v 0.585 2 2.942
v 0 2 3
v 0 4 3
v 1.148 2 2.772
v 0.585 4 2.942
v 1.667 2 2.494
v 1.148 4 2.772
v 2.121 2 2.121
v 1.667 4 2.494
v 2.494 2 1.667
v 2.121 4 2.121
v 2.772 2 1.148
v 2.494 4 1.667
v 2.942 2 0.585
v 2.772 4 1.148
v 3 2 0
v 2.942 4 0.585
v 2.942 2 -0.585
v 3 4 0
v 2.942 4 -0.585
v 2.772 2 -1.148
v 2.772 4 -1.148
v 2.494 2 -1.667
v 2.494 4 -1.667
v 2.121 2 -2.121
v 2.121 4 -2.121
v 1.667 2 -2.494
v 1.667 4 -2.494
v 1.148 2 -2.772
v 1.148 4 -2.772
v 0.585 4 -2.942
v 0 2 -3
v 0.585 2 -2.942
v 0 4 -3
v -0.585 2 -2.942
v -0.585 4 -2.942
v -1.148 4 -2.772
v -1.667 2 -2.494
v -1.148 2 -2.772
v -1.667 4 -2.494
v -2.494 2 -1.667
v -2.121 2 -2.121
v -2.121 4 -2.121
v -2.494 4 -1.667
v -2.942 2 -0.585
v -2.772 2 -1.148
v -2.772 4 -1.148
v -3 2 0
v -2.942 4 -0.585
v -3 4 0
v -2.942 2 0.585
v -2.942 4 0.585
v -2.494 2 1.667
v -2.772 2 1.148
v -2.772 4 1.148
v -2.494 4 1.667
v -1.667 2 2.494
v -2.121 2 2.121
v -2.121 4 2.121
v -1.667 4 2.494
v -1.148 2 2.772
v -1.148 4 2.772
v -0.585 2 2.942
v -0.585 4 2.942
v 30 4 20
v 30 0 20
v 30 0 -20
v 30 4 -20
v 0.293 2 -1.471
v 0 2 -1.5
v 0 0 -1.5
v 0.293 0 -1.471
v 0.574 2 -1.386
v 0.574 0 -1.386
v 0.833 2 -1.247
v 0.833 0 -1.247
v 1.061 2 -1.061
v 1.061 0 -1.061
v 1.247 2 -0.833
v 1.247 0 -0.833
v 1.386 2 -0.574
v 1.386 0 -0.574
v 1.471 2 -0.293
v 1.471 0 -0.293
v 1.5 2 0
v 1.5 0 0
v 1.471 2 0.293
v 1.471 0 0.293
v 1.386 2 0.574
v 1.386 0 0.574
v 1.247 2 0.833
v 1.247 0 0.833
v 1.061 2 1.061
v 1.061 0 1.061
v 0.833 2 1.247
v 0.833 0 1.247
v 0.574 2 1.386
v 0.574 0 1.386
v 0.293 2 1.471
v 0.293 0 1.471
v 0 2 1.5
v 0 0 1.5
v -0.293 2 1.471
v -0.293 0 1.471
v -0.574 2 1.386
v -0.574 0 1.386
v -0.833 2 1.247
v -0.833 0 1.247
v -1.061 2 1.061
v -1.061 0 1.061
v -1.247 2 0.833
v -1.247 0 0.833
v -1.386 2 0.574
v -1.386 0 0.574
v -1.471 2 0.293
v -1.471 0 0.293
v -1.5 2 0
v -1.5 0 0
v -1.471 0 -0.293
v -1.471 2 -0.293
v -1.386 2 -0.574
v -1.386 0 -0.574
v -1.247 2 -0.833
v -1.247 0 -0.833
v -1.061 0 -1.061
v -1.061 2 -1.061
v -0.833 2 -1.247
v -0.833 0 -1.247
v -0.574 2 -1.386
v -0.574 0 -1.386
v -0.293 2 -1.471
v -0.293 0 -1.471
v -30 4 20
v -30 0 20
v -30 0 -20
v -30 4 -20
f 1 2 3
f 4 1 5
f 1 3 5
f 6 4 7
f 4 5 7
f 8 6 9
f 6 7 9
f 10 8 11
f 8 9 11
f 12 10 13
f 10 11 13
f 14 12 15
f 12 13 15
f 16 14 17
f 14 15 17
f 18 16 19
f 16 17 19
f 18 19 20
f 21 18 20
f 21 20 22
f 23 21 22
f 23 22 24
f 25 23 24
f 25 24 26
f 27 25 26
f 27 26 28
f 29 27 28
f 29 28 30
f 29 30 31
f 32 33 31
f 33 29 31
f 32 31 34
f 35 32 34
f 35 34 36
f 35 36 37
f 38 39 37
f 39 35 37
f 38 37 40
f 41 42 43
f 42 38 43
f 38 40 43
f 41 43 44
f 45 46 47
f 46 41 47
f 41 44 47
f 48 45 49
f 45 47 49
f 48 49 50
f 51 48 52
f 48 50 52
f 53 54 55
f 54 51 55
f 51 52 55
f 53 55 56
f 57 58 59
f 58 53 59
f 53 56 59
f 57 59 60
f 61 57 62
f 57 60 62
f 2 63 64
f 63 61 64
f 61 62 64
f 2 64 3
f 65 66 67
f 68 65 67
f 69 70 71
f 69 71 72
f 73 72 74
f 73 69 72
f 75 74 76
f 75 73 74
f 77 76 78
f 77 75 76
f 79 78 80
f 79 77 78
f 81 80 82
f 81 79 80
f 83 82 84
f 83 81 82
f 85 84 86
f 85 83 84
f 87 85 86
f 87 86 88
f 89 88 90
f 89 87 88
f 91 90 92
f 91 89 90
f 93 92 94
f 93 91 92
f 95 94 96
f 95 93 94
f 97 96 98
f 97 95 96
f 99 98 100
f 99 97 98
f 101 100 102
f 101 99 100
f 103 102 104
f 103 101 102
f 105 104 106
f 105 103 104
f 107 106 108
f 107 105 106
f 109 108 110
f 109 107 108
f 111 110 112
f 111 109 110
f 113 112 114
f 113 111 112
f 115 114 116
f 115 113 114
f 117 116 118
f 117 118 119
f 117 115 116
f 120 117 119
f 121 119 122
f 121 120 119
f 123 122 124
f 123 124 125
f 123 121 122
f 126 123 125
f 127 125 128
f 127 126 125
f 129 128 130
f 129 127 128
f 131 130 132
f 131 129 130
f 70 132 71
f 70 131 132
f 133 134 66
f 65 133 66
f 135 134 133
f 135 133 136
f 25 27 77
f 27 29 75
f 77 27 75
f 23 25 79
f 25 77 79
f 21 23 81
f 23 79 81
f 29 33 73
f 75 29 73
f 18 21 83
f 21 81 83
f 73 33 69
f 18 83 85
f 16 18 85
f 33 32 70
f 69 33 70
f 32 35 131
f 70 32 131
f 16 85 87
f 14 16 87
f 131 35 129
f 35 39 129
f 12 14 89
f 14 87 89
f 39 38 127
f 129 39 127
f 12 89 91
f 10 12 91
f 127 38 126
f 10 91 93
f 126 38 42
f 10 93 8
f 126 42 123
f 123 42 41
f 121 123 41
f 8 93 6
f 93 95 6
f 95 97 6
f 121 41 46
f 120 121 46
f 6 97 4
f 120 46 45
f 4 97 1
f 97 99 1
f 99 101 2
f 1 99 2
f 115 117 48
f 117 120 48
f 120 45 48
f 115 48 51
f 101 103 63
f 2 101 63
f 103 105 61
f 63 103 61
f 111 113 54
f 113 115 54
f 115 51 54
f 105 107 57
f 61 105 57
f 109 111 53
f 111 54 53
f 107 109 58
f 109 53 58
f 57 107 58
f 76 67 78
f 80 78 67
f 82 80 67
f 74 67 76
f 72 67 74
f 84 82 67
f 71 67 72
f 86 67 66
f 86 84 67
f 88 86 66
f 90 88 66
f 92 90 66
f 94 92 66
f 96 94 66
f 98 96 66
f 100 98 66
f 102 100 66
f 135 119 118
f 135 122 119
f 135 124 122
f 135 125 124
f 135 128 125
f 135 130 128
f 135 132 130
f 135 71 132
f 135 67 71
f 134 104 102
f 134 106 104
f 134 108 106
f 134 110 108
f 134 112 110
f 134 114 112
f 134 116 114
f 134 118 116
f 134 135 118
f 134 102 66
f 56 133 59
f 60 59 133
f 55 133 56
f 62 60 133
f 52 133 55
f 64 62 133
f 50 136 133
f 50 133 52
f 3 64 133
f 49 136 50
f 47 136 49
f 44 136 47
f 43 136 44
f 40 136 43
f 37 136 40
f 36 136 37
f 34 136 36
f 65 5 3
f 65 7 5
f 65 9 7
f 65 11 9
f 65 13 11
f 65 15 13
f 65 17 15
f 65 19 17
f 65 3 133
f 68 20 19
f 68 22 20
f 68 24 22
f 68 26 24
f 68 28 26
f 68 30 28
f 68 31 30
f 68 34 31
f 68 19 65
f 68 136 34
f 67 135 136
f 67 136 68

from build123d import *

# Parameters (mm, degrees)
SKETCH1_W           = 60
SKETCH1_H           = 40
BOSS_EXTRUDE1_DEPTH = 4
SKETCH2_R           = 3
CUT_EXTRUDE1_DEPTH  = 4
BOSS_EXTRUDE2_START = -2
SKETCH3_R           = 3
SKETCH3_R_2         = 1.5
BOSS_EXTRUDE2_DEPTH = 2


with BuildPart() as part:
    # Sketch1 → Boss-Extrude1 (new body)
    with BuildSketch(Plane(origin=(0, 0, 0), x_dir=(1, 0, 0), z_dir=(0, 1, 0))):
        Rectangle(SKETCH1_W, SKETCH1_H)
    extrude(amount=BOSS_EXTRUDE1_DEPTH)

    # Sketch2 → Cut-Extrude1 (cut)
    with BuildSketch(Plane(origin=(0, 4, 0), x_dir=(1, 0, 0), z_dir=(0, 1, 0))):
        with Locations(Location((0, 0, 0), (0, 0, 270))):
            Circle(SKETCH2_R)
    extrude(amount=-CUT_EXTRUDE1_DEPTH, mode=Mode.SUBTRACT)

    # Sketch3 → Boss-Extrude2 (add)
    with BuildSketch(Plane.XZ.offset(BOSS_EXTRUDE2_START)):
        with Locations(Location((0, 0, 0), (0, 0, 90))):
            Circle(SKETCH3_R)
        with Locations(Location((0, 0, 0), (0, 0, 270))):
            Circle(SKETCH3_R_2, mode=Mode.SUBTRACT)
    extrude(amount=BOSS_EXTRUDE2_DEPTH)


solid = part.part
